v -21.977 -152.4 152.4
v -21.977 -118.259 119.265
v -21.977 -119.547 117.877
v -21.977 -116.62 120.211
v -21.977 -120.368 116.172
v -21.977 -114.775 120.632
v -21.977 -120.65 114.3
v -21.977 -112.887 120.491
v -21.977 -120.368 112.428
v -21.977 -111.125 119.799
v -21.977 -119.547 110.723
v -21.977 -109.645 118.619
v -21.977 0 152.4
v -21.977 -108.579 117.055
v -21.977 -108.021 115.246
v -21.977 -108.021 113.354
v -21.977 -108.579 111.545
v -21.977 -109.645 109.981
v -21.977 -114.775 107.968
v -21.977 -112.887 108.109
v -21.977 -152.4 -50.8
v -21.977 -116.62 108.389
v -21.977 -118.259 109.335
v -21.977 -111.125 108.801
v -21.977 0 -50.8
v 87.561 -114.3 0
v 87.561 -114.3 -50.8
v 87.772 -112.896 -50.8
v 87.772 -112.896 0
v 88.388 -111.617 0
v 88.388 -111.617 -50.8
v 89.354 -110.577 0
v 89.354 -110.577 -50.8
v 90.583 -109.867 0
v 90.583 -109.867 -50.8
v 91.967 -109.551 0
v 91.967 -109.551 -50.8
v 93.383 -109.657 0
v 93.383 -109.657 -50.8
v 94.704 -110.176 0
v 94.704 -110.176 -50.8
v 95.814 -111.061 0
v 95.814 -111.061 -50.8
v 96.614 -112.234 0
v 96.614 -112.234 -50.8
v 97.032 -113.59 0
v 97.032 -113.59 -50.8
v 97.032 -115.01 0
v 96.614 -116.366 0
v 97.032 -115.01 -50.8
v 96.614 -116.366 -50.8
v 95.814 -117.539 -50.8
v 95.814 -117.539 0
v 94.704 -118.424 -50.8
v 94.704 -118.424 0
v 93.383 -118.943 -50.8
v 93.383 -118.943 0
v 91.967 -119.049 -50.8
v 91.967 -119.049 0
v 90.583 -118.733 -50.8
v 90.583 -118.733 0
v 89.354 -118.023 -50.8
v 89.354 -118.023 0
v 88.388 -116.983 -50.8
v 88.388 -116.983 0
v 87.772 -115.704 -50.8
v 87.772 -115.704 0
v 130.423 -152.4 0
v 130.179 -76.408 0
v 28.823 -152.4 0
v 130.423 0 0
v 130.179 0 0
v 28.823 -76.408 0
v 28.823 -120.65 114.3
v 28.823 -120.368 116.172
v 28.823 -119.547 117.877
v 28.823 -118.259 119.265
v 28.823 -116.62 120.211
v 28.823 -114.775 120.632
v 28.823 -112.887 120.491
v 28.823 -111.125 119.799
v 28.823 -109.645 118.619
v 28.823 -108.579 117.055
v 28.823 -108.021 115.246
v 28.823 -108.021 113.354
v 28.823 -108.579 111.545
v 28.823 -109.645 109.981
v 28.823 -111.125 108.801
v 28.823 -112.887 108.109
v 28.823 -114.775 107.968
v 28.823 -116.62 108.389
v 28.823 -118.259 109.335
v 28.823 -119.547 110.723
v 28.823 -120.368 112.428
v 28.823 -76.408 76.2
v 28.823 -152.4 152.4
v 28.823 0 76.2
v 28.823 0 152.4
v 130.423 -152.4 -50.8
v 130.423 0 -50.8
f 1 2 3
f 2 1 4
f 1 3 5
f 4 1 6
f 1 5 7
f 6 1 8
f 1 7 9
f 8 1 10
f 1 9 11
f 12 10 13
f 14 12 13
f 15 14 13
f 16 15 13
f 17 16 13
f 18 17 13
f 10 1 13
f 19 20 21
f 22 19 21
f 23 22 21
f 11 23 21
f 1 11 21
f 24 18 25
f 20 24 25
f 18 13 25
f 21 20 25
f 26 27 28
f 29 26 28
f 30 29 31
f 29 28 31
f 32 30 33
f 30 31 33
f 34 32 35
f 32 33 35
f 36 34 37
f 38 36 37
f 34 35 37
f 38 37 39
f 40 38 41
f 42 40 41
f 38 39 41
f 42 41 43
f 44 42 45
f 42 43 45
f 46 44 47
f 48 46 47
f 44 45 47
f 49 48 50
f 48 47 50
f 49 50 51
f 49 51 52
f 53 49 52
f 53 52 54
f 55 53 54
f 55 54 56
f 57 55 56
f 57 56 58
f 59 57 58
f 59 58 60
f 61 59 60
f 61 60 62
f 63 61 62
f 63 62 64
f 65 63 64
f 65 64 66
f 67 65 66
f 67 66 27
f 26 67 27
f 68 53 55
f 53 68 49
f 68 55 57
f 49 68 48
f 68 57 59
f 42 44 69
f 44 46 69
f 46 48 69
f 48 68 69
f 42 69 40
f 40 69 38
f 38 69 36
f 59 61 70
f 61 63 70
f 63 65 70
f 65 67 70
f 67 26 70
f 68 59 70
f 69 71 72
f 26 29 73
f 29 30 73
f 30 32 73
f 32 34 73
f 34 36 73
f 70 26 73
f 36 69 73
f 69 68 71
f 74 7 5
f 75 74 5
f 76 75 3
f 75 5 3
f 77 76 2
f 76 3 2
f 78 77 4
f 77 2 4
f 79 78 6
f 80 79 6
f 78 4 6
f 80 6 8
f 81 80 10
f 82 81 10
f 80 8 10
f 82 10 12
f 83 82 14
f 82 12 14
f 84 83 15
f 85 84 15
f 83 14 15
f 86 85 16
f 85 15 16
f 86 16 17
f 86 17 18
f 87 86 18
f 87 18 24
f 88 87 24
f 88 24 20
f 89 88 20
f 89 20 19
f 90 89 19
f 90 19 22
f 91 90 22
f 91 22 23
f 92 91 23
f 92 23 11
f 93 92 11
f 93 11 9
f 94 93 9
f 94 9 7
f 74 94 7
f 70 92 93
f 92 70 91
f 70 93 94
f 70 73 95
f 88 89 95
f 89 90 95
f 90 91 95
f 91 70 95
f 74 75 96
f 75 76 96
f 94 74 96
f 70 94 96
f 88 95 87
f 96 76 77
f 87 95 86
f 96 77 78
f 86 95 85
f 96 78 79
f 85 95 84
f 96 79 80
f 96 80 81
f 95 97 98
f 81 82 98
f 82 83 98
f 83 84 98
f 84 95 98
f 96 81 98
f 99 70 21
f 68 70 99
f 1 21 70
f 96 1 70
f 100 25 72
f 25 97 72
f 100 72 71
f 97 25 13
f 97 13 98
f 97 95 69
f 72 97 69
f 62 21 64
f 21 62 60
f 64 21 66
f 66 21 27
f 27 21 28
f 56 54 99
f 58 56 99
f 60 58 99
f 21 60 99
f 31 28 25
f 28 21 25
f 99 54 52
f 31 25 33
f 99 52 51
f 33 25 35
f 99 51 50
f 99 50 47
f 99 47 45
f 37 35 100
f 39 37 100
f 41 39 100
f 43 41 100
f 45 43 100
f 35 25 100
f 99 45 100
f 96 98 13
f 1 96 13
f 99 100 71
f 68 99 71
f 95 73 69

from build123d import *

# Parameters (mm, degrees)
F1_DEPTH = 152.4
F2_W     = 101.356273
F2_H     = 76.407738
F3_DEPTH = 76.2
F5_DEPTH = 84.108479
F7_D     = 9.525
F9_D     = 12.7


with BuildPart() as f1:
    # F0 (on Front) → F1 (new body)
    with BuildSketch(Plane.XZ):
        Polygon((28.823013, 0), (28.823013, 152.4), (-21.976987, 152.4), (-21.976987, -50.8), (130.423013, -50.8), (130.423013, 0), align=None)
    extrude(amount=F1_DEPTH)

    # F2 (on face) → F3 (join)
    with BuildSketch(Plane.XY):
        with Locations((79.501149, -38.203869)):
            Rectangle(F2_W, F2_H)
    extrude(amount=F3_DEPTH)

    # F4 (on face) → F5 (cut)
    with BuildSketch(Plane.XZ.offset(76.407738)):
        Polygon((130.179286, 76.2), (28.823013, 76.2), (130.179286, 0), align=None)
    extrude(amount=-F5_DEPTH, mode=Mode.SUBTRACT)

    # F7 (through all)
    with Locations(Plane.XY):
        with Locations((92.323013, -114.3)):
            Hole(F7_D / 2)

    # F9 (through all)
    with Locations(Plane.YZ.offset(28.823013)):
        with Locations((-114.3, 114.3)):
            Hole(F9_D / 2)


solid = f1.part
